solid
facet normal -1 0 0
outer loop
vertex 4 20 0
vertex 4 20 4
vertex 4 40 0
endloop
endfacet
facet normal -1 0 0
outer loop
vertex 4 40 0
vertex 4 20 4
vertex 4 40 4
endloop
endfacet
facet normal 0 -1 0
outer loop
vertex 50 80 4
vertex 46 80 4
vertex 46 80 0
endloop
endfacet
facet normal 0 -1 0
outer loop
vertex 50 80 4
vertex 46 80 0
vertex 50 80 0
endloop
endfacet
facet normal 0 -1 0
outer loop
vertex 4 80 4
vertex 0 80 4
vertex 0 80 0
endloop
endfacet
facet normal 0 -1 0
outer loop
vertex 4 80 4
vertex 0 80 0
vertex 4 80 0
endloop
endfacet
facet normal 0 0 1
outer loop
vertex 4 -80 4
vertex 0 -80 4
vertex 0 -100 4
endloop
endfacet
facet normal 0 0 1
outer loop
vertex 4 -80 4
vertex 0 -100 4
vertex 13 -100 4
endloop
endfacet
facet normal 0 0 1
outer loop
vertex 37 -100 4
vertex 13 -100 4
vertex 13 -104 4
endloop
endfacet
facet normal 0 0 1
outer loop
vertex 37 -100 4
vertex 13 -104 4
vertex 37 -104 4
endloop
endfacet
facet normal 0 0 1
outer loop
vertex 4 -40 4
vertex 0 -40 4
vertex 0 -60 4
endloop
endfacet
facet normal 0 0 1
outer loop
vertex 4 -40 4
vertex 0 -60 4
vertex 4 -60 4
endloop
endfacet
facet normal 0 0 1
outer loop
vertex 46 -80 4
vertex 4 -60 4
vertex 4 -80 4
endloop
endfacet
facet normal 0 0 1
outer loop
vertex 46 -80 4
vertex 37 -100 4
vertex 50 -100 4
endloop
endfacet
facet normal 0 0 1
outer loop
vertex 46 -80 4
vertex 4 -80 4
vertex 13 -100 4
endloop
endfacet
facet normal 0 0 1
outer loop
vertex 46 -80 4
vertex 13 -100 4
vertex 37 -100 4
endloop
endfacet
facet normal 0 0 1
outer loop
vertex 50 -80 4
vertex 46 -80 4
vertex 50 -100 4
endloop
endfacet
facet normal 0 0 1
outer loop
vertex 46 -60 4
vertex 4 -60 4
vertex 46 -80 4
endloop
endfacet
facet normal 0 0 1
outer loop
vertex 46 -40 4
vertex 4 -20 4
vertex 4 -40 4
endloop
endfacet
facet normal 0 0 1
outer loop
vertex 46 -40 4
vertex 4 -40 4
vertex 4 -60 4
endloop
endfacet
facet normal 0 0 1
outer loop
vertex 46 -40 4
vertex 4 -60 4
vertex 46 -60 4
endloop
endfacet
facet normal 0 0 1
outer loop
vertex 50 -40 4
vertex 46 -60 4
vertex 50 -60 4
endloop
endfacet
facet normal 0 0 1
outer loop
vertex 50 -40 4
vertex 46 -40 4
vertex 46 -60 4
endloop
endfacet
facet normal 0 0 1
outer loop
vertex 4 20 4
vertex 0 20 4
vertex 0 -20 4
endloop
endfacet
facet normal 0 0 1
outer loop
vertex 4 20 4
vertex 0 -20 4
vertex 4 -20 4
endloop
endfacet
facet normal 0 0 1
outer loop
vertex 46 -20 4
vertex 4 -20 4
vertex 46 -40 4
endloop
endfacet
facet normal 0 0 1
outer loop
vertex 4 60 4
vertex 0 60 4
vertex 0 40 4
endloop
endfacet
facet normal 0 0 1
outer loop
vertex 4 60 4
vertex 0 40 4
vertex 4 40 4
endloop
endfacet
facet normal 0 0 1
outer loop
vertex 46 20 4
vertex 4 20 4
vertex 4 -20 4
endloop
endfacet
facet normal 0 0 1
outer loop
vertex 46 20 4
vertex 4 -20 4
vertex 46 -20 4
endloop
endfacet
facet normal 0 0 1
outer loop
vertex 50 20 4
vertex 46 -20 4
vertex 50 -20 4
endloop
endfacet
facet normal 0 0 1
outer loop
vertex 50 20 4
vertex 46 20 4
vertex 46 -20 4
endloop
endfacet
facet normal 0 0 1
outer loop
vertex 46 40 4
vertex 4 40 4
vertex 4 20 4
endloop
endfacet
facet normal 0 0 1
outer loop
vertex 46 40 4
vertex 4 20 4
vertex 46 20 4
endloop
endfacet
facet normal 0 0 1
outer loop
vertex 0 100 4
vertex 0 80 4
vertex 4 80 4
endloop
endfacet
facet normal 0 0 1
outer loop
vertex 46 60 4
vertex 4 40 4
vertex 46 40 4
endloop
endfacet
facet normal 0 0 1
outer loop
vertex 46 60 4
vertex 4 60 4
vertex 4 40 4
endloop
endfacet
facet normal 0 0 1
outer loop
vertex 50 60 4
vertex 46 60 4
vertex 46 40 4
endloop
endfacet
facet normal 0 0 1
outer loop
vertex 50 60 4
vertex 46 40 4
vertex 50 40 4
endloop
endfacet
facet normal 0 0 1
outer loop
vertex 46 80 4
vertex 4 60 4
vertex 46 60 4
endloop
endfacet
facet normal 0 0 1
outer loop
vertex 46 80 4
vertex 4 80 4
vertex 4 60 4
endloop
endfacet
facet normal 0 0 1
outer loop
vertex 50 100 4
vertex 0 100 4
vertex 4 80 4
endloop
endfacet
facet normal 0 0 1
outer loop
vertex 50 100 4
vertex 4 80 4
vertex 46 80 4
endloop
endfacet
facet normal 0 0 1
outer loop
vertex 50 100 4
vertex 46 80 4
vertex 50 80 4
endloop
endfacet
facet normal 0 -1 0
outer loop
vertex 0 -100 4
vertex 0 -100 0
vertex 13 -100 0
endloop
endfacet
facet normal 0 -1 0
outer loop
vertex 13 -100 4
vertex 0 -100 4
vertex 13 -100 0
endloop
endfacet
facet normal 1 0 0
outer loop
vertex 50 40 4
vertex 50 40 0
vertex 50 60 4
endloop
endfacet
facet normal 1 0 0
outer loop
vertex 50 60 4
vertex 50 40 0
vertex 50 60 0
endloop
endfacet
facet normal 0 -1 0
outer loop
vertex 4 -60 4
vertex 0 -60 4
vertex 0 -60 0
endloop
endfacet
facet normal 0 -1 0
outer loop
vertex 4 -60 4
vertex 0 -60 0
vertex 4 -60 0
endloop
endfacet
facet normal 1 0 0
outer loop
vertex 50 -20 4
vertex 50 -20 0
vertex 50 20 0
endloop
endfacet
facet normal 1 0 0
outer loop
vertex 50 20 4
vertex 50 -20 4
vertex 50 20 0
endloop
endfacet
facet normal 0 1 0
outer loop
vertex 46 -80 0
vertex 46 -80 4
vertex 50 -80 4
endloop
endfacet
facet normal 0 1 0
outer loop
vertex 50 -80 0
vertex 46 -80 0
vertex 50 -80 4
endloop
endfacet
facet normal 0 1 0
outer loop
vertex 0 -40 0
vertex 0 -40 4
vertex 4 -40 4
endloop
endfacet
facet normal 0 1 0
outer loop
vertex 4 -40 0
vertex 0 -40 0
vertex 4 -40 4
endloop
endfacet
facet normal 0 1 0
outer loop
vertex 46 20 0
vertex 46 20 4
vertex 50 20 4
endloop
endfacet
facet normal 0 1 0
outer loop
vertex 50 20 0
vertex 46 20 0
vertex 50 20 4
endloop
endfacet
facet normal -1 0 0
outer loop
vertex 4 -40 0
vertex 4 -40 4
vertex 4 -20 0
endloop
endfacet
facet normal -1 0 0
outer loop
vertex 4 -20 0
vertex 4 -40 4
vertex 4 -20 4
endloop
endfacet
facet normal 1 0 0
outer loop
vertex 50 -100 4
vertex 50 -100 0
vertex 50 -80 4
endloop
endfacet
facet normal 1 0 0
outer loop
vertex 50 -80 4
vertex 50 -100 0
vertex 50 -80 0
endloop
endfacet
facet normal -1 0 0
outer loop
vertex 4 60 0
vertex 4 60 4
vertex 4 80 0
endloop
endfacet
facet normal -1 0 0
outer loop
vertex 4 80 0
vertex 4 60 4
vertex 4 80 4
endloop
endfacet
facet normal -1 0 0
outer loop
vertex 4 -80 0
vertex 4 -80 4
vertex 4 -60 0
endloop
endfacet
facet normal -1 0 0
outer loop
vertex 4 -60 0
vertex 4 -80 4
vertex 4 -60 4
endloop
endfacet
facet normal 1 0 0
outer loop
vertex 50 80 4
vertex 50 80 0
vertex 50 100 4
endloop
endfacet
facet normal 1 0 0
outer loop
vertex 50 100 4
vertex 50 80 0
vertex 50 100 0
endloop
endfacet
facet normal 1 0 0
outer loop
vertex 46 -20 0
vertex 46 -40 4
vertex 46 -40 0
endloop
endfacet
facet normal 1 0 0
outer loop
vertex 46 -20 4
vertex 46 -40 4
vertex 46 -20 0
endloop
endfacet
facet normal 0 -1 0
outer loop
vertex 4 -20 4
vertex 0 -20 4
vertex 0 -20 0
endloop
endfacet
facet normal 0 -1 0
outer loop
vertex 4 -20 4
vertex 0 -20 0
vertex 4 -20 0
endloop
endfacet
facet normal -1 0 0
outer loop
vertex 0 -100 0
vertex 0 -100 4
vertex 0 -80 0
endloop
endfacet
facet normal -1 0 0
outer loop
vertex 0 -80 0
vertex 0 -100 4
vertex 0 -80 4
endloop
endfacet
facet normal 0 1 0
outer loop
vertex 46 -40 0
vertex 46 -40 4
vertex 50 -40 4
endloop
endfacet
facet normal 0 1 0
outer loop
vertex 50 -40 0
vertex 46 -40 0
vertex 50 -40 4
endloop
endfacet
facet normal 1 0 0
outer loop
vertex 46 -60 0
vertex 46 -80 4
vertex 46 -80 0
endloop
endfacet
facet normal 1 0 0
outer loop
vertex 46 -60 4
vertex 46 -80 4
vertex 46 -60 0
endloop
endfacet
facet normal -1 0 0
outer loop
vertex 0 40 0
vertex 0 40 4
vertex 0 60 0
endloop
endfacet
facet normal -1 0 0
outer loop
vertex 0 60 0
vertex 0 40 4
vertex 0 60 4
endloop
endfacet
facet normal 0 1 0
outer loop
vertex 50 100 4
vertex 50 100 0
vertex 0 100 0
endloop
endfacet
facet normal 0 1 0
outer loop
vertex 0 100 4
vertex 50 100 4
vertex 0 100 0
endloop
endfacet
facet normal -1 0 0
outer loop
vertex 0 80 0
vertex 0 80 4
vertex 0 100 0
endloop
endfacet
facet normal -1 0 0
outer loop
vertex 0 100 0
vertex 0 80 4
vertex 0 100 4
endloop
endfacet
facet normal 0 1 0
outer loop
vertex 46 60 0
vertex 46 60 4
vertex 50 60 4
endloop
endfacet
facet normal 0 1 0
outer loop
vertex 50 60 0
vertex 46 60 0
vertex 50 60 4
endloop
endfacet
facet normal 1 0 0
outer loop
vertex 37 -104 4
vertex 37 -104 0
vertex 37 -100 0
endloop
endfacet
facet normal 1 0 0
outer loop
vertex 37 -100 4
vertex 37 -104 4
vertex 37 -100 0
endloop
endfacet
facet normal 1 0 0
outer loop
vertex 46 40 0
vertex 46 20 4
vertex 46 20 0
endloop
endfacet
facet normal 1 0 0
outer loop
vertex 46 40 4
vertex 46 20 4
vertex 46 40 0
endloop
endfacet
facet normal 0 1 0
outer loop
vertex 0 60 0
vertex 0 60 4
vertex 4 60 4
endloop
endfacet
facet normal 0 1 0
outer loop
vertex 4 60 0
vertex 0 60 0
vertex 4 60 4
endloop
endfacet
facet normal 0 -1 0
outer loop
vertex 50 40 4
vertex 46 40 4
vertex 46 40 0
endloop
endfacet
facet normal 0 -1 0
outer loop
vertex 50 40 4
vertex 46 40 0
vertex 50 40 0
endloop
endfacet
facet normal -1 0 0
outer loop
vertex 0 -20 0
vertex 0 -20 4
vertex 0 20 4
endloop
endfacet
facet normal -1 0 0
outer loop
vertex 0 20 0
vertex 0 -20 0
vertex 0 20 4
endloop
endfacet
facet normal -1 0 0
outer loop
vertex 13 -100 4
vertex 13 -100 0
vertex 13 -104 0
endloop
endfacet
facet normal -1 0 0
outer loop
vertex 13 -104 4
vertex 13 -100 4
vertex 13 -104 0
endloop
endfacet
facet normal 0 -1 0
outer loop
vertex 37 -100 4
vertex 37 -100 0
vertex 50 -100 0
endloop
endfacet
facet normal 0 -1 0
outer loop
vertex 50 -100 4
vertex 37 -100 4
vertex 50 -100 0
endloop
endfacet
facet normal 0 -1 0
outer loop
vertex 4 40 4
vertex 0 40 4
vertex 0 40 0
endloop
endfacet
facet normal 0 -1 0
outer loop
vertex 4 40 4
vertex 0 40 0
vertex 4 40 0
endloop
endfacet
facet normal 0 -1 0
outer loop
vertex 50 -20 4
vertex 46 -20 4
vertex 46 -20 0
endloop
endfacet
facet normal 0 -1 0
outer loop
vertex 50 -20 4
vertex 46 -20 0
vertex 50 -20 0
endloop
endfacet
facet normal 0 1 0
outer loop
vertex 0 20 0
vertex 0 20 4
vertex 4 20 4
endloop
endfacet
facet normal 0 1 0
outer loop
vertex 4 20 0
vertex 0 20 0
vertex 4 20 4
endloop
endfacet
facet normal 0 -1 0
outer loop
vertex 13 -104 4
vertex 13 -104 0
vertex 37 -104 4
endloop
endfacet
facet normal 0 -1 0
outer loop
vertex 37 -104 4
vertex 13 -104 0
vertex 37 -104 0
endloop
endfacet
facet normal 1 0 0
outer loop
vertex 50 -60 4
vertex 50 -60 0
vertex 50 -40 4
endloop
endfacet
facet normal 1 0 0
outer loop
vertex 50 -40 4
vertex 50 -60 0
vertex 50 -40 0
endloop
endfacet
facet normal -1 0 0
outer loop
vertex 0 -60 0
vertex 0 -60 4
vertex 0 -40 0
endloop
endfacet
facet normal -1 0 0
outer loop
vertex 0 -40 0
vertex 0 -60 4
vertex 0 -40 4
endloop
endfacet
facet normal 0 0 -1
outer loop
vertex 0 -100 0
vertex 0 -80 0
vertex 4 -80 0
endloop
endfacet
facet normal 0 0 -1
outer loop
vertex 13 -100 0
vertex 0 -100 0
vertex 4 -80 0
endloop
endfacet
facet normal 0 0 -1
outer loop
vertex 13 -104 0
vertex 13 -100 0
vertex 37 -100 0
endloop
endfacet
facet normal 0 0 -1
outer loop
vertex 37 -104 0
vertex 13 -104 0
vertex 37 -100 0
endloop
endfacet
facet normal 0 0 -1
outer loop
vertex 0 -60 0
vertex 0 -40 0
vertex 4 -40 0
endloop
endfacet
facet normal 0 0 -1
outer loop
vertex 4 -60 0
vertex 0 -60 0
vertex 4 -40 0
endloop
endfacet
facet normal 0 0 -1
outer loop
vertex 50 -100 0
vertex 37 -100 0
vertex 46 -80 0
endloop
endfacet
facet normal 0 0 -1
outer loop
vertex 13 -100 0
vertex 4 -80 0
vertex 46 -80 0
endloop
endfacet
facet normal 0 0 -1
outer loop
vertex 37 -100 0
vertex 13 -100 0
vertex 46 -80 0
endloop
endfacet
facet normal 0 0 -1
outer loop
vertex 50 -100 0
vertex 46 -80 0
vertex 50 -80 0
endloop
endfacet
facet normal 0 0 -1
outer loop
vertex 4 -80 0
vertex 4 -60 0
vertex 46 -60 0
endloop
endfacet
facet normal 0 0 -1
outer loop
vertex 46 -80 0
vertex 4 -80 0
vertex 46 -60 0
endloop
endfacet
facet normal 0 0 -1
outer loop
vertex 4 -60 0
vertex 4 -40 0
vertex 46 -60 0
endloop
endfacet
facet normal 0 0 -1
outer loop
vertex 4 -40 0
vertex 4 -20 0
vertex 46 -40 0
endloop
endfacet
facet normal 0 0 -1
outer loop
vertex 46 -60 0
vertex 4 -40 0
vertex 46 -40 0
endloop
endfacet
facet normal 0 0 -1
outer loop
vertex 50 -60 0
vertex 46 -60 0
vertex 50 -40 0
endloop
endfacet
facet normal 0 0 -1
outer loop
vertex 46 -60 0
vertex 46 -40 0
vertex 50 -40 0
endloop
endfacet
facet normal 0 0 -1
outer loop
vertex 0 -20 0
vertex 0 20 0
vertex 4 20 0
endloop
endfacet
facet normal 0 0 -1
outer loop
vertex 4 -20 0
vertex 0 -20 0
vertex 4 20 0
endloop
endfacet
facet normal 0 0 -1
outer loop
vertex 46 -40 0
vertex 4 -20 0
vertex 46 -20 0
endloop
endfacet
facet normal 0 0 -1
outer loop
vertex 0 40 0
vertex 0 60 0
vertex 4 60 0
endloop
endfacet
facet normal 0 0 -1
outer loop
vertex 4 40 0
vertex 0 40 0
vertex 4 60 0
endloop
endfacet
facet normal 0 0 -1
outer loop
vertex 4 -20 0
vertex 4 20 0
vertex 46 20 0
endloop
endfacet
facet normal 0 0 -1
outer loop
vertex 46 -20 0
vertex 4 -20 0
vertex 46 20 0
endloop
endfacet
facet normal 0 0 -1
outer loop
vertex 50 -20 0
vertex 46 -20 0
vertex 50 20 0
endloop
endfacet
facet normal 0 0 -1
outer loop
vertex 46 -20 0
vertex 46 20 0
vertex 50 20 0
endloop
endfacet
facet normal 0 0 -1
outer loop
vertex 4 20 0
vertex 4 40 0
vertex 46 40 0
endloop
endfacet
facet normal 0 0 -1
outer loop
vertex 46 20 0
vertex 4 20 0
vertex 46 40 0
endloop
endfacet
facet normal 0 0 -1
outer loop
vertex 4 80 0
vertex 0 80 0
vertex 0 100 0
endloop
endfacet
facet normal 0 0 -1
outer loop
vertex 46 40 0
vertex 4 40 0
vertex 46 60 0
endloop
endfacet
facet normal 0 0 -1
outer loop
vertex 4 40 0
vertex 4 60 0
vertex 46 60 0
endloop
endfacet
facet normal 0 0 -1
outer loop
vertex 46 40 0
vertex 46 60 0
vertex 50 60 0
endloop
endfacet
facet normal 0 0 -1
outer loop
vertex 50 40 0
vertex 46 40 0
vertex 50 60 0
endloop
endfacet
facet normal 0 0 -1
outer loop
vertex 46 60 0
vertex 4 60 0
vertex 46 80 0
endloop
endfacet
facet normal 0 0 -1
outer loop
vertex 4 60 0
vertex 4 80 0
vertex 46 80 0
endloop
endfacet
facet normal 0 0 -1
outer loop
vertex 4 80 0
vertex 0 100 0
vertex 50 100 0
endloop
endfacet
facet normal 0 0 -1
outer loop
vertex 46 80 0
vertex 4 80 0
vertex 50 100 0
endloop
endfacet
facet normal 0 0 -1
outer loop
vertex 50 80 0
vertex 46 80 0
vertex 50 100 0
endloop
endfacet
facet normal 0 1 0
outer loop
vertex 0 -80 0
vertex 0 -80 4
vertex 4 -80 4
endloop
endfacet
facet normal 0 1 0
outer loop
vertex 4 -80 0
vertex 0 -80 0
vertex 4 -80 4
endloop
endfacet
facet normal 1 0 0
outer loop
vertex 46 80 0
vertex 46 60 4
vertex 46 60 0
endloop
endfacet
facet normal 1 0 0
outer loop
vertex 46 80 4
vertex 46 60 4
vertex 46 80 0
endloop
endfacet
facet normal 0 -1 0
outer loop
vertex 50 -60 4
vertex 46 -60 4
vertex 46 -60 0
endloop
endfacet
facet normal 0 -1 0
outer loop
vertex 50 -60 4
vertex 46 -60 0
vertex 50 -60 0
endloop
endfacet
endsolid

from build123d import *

# Parameters (mm, degrees)
RESSALTO_EXTRUS_O1_DEPTH = 4
ESBO_O2_W                = 4
ESBO_O2_H                = 20
CORTE_EXTRUS_O1_DEPTH    = 116.464280191
ESBO_O3_W                = 4
ESBO_O3_H                = 20
CORTE_EXTRUS_O2_DEPTH    = 116.464280191


with BuildPart() as part:
    # Esboço1 → Ressalto-extrusão1 (new body)
    with BuildSketch(Plane.XY):
        Polygon((-50, -100), (-37, -100), (-37, -104), (-13, -104), (-13, -100), (13, -100), (13, -104), (37, -104), (37, -100), (50, -100), (50, 100), (-50, 100), align=None)
    extrude(amount=RESSALTO_EXTRUS_O1_DEPTH)

    # Esboço2 → Corte-extrusão1 (cut, through all)
    with BuildSketch(Plane.XY.offset(4)):
        Polygon((-50, 0), (0, 0), (0, 20), (0, 40), (0, 60), (0, 80), (0, 100), (-50, 100), align=None)
        Polygon((-13, -100), (0, -100), (0, -80), (0, -60), (0, -40), (0, -20), (0, 0), (-50, 0), (-50, -100), (-37, -100), (-37, -104), (-13, -104), align=None)
        with Locations((2, 70)):
            Rectangle(ESBO_O2_W, ESBO_O2_H)
        with Locations((2, -30)):
            Rectangle(ESBO_O2_W, ESBO_O2_H)
        with Locations((2, -70)):
            Rectangle(ESBO_O2_W, ESBO_O2_H)
        with Locations((2, 30)):
            Rectangle(ESBO_O2_W, ESBO_O2_H)
    extrude(amount=-CORTE_EXTRUS_O1_DEPTH, mode=Mode.SUBTRACT)

    # Esboço3 → Corte-extrusão2 (cut, through all)
    with BuildSketch(Plane.XY.offset(4)):
        with Locations((48, 70)):
            Rectangle(ESBO_O3_W, ESBO_O3_H)
        with Locations((48, 30)):
            Rectangle(ESBO_O3_W, ESBO_O3_H)
        with Locations((48, -70)):
            Rectangle(ESBO_O3_W, ESBO_O3_H)
        with Locations((48, -30)):
            Rectangle(ESBO_O3_W, ESBO_O3_H)
    extrude(amount=-CORTE_EXTRUS_O2_DEPTH, mode=Mode.SUBTRACT)


solid = part.part
